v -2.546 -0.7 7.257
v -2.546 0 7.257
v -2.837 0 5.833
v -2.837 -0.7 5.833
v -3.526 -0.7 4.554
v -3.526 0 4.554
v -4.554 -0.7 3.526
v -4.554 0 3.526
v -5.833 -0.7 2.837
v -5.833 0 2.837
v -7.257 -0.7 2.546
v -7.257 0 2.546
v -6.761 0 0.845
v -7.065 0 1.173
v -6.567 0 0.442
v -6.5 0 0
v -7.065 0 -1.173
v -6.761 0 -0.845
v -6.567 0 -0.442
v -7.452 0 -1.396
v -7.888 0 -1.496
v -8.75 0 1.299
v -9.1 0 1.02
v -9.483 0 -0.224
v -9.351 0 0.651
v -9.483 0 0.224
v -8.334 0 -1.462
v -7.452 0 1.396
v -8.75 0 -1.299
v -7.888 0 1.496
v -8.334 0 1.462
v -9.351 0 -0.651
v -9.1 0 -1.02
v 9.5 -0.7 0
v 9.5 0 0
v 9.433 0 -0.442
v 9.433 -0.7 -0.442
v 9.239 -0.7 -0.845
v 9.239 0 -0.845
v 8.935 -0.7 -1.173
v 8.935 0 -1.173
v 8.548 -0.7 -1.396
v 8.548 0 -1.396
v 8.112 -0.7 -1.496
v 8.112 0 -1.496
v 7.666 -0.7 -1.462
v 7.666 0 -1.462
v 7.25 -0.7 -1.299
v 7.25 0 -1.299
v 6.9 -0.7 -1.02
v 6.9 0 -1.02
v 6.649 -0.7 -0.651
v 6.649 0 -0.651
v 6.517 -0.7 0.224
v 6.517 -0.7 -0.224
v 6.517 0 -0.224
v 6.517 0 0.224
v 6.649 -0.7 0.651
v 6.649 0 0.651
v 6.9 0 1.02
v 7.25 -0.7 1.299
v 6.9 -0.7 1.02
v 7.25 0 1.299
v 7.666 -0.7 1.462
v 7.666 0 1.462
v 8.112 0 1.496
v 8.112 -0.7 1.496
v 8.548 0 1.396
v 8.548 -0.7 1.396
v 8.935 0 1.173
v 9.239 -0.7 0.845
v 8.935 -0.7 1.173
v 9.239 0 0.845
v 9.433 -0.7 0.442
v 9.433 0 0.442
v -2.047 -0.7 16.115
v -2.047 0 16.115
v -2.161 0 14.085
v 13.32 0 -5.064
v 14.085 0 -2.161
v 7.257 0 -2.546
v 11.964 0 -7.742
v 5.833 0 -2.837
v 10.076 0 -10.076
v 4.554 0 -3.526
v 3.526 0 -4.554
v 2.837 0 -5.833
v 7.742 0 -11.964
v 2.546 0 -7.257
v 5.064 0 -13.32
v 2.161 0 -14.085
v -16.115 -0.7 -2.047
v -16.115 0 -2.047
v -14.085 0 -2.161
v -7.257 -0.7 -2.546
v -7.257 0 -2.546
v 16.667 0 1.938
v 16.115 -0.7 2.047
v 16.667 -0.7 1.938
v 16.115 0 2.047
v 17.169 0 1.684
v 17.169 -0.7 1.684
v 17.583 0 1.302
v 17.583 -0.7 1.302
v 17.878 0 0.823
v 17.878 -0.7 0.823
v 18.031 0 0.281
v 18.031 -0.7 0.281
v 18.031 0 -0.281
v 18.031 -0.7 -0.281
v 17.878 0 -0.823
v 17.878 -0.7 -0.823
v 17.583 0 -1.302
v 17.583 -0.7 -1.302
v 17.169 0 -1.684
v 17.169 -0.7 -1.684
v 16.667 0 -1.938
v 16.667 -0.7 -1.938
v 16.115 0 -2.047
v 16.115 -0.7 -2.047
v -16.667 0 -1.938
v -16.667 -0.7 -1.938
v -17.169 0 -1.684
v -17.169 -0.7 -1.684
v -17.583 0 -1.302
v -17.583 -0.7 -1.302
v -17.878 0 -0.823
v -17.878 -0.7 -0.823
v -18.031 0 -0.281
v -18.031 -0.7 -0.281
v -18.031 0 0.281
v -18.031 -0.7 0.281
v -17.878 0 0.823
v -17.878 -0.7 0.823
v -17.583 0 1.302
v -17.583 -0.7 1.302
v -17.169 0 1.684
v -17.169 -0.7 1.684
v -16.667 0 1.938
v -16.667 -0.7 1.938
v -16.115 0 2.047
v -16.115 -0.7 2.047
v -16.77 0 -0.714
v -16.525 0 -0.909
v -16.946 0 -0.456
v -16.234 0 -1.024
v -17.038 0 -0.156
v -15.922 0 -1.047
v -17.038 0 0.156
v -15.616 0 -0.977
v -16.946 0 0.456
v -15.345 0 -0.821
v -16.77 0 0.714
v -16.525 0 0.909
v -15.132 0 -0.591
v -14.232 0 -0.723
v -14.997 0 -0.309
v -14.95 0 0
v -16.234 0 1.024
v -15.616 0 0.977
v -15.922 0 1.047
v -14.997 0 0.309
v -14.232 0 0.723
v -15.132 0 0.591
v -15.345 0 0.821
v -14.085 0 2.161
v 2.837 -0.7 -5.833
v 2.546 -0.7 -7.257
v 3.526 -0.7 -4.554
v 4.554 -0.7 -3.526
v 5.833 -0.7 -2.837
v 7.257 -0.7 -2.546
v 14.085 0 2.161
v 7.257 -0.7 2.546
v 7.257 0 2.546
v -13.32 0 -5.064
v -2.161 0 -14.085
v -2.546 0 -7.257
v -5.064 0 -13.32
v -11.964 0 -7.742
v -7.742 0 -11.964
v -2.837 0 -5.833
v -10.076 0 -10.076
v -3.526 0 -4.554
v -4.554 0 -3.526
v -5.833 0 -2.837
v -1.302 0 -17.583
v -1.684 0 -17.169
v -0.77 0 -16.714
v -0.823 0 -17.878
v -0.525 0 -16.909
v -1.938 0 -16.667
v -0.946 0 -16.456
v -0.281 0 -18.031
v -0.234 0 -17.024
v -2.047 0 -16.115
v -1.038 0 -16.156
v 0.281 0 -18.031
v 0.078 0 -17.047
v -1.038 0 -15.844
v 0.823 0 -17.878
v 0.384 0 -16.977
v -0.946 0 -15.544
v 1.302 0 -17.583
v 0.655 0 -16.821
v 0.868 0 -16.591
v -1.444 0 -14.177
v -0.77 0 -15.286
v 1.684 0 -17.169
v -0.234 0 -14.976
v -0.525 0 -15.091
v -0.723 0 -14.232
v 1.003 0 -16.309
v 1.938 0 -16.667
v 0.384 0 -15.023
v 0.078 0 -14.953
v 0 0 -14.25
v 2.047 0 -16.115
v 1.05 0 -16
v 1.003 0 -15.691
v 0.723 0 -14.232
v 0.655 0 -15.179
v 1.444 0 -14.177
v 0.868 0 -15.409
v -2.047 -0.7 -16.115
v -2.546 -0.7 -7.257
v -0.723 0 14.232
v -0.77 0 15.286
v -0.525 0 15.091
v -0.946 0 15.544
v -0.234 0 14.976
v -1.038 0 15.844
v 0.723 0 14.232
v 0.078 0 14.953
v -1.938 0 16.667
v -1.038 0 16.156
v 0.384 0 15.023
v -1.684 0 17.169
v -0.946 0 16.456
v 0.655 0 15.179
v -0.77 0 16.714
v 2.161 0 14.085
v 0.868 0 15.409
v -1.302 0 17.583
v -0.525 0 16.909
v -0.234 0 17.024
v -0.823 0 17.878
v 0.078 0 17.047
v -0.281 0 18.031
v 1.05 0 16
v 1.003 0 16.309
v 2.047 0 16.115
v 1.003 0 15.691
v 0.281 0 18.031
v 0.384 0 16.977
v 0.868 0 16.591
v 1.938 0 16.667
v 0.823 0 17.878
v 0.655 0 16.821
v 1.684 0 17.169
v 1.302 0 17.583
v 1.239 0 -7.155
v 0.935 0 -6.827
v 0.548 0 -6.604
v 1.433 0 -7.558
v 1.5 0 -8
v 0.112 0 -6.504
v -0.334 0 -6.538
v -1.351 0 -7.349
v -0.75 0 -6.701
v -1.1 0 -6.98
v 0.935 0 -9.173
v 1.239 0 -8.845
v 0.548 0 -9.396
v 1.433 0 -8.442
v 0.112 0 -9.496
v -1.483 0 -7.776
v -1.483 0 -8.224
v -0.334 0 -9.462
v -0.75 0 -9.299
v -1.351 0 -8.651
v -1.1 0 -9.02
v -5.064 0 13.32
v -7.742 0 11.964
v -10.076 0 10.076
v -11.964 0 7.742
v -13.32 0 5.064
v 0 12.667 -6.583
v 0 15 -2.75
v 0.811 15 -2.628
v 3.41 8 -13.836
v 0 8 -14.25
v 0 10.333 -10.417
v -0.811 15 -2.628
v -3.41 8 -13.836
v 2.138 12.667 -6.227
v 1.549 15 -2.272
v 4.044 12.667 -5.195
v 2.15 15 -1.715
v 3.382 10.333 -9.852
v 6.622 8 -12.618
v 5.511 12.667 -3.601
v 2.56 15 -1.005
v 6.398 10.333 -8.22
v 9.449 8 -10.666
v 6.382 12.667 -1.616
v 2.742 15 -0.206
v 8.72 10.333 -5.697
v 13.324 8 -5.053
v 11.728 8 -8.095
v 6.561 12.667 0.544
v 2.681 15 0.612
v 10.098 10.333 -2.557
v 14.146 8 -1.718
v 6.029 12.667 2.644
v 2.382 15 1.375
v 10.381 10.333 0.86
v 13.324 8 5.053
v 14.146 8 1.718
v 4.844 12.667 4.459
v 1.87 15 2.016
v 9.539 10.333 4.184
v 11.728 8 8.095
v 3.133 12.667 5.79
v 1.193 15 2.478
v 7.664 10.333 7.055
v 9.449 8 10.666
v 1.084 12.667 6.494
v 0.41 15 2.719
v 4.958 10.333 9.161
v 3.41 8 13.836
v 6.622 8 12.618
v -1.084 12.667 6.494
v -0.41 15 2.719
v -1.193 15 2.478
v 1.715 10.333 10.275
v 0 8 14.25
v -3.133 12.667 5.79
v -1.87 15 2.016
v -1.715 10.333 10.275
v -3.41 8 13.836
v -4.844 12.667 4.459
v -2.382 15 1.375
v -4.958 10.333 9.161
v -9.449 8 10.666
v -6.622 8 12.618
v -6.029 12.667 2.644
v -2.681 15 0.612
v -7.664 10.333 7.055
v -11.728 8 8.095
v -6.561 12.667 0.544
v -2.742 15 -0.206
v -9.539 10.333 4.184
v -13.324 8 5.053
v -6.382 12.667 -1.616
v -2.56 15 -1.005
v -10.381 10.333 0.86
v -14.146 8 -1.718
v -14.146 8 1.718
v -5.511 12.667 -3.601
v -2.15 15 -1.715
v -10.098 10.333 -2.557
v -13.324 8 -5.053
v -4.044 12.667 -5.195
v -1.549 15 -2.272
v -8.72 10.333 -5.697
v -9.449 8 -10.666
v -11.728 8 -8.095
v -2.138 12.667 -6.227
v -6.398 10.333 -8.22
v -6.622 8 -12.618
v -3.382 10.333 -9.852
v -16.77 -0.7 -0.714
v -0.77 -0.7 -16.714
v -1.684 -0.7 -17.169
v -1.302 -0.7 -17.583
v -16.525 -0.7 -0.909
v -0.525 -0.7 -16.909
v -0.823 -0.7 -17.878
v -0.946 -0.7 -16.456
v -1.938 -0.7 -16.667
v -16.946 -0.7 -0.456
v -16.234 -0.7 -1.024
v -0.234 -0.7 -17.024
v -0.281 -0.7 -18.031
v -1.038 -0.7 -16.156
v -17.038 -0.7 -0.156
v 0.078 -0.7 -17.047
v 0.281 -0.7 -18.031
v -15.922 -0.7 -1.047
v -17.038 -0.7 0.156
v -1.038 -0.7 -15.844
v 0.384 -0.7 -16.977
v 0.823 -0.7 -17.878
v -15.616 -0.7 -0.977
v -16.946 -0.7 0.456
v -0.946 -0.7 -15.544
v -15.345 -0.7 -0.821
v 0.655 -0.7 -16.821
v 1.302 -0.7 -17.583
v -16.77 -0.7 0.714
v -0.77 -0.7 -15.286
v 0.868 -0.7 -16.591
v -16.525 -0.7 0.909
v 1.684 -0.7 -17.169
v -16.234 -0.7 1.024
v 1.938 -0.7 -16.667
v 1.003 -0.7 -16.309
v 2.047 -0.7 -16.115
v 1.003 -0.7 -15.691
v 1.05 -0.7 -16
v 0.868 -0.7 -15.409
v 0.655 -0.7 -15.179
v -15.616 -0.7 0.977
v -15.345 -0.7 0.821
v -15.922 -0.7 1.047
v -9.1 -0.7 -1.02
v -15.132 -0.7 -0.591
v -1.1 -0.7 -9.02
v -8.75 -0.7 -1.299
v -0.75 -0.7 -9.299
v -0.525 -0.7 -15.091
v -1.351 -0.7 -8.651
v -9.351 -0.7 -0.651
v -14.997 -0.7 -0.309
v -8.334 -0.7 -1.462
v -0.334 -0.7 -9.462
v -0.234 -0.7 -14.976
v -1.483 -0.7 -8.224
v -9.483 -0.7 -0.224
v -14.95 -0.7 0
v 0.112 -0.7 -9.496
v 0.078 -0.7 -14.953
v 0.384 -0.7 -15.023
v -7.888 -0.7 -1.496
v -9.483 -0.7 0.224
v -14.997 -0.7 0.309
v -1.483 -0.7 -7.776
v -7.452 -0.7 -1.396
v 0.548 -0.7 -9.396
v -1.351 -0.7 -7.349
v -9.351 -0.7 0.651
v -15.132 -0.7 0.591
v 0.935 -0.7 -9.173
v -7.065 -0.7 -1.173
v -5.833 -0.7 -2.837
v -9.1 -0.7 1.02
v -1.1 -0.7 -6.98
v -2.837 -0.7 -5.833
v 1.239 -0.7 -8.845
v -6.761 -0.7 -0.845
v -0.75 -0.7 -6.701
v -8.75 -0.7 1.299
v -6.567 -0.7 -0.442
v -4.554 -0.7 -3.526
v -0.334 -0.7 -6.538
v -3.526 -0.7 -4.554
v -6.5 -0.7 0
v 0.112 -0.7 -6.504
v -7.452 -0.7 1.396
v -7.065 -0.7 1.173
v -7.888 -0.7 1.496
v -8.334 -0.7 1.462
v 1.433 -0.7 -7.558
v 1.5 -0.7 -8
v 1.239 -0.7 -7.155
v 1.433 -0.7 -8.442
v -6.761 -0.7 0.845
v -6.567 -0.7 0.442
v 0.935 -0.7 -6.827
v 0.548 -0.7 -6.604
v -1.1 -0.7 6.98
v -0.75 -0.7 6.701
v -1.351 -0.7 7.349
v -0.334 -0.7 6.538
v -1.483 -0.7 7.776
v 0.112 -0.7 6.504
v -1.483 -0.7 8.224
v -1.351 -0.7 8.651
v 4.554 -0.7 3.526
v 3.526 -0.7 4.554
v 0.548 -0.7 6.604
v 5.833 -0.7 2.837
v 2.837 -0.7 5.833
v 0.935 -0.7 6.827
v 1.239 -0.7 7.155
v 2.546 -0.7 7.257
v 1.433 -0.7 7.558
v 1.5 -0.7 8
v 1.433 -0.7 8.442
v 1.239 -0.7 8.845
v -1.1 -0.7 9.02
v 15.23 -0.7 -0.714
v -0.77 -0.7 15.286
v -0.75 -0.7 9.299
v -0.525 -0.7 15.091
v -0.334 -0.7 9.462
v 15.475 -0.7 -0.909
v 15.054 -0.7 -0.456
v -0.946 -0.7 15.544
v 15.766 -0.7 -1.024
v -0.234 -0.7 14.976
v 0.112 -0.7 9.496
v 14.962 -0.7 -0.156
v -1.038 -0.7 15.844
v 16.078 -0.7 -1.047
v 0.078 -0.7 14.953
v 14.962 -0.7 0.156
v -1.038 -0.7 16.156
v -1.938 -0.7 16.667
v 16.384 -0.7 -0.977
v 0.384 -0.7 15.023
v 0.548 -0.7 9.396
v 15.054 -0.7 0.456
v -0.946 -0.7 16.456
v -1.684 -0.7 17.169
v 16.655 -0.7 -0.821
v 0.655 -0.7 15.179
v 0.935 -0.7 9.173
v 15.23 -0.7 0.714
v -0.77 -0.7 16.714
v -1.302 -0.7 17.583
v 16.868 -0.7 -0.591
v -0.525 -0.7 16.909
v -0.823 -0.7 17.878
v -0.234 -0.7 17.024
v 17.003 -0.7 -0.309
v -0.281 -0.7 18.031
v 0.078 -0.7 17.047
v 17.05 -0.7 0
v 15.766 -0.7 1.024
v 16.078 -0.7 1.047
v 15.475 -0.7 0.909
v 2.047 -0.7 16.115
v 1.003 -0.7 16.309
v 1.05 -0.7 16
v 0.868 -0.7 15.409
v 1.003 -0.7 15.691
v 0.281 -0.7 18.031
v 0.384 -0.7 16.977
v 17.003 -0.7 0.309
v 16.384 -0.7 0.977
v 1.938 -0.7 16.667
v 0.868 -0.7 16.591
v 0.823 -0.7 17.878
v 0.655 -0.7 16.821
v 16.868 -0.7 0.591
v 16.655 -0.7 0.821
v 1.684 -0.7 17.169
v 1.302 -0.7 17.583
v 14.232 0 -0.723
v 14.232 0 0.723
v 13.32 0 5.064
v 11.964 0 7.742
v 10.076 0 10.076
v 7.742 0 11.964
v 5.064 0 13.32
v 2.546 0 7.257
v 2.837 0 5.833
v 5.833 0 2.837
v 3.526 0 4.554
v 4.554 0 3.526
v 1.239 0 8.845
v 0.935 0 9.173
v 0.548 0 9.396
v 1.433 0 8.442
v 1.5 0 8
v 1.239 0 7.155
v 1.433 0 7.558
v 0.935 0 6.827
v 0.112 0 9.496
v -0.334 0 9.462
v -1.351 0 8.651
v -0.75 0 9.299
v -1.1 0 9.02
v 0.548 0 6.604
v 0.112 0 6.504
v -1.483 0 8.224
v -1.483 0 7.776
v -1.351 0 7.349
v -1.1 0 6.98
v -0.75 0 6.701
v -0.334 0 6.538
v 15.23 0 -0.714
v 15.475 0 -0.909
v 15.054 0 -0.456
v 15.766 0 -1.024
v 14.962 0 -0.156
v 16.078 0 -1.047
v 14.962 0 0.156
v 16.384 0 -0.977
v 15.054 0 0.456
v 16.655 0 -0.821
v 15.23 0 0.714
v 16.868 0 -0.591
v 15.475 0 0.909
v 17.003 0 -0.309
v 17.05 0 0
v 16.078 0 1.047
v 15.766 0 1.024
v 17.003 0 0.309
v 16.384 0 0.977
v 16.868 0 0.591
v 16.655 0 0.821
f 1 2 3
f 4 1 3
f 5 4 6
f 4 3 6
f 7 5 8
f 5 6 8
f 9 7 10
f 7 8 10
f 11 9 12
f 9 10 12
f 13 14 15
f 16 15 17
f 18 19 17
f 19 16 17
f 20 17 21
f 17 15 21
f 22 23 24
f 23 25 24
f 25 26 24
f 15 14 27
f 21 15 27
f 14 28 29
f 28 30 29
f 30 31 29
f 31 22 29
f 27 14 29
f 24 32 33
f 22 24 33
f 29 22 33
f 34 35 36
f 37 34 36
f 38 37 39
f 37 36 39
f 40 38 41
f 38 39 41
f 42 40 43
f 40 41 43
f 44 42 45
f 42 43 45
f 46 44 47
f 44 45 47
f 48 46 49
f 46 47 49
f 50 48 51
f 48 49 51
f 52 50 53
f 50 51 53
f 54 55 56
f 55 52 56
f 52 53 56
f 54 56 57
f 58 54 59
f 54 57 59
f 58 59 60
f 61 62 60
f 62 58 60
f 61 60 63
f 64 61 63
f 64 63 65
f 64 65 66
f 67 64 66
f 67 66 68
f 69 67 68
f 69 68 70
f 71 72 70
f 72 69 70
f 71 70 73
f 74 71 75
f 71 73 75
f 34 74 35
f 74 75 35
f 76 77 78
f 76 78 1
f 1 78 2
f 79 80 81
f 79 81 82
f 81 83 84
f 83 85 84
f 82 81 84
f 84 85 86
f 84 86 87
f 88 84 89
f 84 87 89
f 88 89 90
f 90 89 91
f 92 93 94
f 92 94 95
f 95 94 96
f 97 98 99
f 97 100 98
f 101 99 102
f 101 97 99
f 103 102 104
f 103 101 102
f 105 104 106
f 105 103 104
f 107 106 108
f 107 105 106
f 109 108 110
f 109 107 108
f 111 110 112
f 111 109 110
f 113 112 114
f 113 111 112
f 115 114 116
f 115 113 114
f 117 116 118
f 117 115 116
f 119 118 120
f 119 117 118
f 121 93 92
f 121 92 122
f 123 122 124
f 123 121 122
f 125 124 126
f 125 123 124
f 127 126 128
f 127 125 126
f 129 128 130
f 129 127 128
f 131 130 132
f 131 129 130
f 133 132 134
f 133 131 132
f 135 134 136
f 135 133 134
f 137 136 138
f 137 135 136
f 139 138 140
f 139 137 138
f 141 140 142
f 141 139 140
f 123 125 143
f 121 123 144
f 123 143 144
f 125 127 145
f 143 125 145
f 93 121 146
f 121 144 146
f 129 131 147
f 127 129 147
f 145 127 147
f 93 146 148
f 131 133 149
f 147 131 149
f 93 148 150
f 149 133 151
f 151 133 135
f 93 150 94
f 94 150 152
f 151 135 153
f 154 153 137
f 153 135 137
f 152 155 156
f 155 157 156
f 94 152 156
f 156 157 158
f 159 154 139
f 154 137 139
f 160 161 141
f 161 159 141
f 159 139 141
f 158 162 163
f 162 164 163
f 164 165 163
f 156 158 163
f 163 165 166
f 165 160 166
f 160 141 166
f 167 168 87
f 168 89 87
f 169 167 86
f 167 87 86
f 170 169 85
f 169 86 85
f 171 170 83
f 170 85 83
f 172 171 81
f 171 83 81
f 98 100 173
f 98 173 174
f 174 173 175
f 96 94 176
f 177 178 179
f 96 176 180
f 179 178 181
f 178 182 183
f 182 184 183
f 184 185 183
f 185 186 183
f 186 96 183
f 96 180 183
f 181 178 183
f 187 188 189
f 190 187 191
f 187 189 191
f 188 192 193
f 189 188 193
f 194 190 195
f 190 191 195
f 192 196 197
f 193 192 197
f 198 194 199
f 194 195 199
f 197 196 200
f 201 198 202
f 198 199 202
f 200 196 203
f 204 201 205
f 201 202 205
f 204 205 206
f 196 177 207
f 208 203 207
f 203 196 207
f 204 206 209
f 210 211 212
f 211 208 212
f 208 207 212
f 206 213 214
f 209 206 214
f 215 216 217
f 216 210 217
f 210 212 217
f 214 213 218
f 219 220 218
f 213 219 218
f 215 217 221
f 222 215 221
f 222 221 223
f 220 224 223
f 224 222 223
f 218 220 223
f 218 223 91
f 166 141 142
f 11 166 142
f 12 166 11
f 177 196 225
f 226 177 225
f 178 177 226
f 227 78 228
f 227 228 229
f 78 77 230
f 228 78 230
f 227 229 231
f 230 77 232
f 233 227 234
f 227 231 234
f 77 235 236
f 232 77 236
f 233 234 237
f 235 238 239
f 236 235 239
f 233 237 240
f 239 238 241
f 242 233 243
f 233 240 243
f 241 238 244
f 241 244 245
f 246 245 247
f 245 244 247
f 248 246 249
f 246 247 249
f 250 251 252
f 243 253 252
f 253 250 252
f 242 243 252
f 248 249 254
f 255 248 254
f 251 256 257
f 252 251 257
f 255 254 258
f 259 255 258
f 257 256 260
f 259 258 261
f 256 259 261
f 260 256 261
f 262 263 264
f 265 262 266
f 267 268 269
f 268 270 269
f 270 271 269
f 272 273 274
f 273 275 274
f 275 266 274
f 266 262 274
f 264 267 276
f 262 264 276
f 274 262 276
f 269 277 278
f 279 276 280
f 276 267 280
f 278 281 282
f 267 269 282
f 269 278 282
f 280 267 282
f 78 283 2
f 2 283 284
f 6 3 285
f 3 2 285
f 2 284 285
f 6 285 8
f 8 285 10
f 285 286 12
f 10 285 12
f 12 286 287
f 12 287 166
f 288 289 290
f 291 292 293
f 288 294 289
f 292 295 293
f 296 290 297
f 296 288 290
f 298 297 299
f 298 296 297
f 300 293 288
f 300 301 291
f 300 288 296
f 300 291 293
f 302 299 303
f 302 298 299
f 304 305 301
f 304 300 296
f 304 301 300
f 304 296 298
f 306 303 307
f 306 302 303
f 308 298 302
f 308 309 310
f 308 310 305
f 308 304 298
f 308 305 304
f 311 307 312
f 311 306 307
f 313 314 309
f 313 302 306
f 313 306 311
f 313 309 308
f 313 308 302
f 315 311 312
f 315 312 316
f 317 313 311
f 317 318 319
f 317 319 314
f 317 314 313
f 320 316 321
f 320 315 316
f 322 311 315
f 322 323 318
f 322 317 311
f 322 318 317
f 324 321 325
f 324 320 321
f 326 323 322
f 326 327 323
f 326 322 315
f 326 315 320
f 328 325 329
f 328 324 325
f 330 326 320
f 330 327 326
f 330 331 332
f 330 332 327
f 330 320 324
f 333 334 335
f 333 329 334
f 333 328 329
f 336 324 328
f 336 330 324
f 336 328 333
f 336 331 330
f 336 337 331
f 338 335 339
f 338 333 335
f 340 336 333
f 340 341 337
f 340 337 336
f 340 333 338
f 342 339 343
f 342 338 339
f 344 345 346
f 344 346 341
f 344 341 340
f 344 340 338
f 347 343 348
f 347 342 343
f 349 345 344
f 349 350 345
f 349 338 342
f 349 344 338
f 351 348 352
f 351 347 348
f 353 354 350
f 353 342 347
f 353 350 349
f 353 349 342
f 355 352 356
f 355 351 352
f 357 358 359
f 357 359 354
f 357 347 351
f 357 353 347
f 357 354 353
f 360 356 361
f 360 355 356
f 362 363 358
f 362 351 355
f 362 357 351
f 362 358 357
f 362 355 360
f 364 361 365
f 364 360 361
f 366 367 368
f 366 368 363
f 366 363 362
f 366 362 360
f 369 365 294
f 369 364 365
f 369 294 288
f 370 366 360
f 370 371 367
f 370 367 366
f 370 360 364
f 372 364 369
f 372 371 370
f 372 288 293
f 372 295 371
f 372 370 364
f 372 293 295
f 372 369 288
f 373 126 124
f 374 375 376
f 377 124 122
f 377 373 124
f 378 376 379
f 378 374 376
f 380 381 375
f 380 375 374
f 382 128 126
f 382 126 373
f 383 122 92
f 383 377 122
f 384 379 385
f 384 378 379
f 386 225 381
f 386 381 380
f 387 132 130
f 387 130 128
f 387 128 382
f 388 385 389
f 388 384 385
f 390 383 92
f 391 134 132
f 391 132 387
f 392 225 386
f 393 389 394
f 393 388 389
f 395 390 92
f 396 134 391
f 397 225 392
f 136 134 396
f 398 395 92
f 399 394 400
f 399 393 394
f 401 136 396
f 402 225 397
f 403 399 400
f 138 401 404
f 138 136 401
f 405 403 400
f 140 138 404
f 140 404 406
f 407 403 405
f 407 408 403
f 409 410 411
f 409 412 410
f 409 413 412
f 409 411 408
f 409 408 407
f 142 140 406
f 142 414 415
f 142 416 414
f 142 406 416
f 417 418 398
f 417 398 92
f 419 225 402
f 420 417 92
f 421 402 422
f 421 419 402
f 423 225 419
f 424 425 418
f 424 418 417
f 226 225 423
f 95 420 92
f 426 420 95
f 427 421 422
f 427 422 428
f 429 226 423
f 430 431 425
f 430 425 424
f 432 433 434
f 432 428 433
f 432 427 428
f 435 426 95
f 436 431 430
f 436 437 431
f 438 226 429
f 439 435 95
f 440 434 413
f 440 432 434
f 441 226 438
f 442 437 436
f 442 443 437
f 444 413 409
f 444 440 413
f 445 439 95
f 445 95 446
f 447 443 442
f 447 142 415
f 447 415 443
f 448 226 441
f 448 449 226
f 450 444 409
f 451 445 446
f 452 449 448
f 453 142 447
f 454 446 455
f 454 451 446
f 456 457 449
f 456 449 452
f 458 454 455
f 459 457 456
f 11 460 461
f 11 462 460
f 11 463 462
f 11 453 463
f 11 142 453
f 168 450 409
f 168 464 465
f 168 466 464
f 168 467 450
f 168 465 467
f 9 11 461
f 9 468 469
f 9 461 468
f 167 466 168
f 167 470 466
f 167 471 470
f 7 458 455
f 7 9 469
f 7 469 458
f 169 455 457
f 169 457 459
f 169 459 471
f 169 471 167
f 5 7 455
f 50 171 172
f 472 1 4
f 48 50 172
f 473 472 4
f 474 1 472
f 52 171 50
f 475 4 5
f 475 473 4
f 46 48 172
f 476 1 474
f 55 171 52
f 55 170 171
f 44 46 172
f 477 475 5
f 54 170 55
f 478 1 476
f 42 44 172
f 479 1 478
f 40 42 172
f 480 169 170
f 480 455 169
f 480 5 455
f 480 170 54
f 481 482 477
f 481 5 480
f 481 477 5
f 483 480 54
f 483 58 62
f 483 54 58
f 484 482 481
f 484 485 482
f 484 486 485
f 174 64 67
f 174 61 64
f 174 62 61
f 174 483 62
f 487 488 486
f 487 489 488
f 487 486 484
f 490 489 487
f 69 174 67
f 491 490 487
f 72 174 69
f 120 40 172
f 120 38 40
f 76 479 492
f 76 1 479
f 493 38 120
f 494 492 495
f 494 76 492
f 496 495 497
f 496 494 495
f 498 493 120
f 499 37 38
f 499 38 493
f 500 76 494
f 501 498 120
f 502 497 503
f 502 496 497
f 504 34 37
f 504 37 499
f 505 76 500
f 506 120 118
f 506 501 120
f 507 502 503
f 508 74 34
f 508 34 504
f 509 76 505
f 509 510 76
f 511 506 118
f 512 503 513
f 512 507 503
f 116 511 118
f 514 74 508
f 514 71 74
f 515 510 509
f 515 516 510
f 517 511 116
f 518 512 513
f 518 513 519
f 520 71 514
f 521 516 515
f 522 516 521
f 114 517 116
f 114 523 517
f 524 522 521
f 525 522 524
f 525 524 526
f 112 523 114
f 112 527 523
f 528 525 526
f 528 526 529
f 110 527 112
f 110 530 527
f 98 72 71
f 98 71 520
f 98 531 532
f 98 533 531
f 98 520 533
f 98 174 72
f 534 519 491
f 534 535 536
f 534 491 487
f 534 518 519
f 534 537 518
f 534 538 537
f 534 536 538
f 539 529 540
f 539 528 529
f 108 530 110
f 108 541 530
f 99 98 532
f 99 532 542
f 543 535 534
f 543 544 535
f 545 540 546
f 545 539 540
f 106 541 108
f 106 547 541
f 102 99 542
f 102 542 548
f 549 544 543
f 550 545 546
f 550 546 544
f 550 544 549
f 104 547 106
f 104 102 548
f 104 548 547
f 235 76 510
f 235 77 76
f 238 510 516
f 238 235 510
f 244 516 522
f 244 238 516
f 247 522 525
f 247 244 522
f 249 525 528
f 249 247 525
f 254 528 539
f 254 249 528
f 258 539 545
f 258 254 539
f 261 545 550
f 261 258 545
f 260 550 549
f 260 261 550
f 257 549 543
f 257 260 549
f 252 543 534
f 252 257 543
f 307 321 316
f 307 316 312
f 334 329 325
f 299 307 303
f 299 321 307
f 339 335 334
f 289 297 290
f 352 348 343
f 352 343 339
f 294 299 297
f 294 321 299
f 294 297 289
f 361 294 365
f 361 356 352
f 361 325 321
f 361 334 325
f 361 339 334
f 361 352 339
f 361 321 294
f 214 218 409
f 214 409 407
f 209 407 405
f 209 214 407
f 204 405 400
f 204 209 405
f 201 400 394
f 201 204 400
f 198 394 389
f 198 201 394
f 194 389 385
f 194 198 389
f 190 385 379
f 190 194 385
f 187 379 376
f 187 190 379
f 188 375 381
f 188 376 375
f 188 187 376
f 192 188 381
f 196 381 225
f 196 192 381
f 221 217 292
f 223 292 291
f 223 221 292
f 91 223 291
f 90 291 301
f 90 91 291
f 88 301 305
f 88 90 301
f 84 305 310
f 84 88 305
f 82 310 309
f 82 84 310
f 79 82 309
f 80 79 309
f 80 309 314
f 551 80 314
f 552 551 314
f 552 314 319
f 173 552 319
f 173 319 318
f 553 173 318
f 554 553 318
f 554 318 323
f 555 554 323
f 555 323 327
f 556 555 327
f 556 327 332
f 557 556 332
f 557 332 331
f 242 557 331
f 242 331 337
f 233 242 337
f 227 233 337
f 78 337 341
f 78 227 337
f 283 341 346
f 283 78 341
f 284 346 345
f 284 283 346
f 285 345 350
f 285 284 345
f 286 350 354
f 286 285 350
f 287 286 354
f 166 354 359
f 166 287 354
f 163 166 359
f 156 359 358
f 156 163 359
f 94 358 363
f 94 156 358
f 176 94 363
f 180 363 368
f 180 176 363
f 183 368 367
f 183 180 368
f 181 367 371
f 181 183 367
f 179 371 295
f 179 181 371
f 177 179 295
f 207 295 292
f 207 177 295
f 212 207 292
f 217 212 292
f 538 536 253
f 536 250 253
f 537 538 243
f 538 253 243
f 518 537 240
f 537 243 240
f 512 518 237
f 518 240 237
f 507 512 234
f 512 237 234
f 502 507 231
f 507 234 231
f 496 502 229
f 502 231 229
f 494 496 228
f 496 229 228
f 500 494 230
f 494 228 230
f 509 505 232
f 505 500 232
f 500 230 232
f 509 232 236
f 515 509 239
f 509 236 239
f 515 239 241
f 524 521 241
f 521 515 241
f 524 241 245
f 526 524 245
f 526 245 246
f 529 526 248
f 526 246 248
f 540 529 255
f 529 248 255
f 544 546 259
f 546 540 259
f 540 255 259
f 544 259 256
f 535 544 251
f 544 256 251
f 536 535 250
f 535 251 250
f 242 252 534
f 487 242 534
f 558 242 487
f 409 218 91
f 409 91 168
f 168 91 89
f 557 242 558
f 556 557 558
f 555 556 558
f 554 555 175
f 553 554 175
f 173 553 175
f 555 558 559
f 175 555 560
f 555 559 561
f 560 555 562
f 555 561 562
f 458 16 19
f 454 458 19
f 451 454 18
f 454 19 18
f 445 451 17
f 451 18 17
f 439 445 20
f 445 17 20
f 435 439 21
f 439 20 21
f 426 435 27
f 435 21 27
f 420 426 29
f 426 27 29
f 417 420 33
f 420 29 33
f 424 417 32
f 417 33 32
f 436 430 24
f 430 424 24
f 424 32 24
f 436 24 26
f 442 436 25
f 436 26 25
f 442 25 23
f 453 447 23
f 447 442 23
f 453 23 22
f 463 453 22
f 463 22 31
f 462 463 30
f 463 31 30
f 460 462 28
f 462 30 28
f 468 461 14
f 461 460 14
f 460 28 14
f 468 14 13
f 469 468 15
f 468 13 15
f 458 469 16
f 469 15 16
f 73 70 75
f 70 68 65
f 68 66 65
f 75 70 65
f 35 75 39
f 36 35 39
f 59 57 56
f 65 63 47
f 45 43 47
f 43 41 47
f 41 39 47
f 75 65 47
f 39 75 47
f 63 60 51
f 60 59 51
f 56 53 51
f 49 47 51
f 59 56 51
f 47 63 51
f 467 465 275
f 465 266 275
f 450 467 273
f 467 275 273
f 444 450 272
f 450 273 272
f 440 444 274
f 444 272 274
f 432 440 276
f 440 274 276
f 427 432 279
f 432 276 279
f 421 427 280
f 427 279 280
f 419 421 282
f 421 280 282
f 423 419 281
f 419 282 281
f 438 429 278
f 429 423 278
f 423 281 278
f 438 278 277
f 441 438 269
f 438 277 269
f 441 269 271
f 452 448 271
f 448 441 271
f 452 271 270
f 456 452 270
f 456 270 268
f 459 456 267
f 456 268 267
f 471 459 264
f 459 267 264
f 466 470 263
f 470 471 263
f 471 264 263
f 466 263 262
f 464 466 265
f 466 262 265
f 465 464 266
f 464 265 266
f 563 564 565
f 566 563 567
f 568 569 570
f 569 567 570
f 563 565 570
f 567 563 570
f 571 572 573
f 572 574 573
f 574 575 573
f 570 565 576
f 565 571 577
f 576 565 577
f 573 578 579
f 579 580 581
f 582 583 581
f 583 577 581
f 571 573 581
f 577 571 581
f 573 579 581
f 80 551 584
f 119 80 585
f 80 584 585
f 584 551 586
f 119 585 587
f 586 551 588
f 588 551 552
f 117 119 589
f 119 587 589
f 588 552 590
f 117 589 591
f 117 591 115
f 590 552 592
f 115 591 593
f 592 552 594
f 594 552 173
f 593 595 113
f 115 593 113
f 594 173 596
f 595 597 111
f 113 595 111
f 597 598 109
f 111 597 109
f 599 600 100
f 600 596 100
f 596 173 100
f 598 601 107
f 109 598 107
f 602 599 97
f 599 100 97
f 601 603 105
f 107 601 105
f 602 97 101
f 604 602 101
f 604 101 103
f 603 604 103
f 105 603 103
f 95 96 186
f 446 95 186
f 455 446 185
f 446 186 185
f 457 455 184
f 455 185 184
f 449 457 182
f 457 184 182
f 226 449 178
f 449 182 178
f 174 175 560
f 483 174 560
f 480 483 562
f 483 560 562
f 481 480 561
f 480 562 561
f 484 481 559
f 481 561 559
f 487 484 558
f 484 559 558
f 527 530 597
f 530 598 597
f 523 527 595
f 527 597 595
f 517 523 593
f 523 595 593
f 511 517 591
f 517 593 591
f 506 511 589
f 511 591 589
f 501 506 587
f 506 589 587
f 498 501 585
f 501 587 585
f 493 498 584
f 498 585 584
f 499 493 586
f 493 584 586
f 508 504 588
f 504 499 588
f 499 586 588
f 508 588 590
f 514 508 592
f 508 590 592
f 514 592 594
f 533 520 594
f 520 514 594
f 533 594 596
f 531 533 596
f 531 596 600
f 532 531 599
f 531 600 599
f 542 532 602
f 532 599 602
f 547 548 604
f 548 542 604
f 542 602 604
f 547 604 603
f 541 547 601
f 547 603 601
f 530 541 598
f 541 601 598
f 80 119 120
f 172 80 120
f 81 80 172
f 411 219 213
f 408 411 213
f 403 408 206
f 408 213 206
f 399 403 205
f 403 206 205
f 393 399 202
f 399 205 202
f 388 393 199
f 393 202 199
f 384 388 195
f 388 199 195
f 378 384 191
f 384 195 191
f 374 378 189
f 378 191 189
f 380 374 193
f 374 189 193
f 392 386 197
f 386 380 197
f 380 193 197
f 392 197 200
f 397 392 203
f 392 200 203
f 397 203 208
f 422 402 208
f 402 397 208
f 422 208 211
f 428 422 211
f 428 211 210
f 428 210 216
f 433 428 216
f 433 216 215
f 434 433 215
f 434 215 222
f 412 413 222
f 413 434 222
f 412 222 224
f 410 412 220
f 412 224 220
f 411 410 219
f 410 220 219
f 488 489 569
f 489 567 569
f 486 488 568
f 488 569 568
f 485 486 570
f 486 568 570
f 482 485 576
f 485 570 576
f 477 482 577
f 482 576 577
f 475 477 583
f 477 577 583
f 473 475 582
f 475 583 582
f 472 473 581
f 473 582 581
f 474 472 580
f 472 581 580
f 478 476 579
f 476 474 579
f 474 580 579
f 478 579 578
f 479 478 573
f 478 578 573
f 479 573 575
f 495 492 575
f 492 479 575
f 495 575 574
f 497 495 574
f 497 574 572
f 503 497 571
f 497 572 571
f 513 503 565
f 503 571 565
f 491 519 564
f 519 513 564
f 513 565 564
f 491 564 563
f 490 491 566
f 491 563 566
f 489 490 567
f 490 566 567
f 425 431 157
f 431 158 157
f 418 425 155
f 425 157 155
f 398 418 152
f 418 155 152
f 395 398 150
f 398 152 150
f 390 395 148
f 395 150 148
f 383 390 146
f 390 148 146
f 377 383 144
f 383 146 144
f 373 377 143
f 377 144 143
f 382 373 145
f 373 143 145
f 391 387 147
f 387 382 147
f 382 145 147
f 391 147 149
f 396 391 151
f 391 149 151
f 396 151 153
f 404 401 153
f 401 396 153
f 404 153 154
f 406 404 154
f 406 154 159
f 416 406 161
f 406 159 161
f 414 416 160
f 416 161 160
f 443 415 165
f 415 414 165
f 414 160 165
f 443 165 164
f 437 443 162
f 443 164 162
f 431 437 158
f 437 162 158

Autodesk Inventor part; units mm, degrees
ref_plane "YZ Plane" through (0, 0, 0) normal (1, 0, 0) x (0, 1, 0)
ref_plane "XZ Plane" through (0, 0, 0) normal (0, 1, 0) x (-1, 0, 0)
ref_plane "XY Plane" through (0, 0, 0) normal (0, 0, 1) x (1, 0, 0)
sketch "スケッチ1" plane through (0, 0, 0) normal (1, 0, 0) x (0, 1, 0)
  line L0 (0, 0) -> (15, 0)
  line L1 (15, 0) -> (15, -2.75)
  line L2 (15, -2.75) -> (8, -14.25)
  line L3 (8, -14.25) -> (0, -14.25)
  line L4 (0, -14.25) -> (0, 0)
  dimension "d0" = 14.25
  dimension "d1" = 15
  dimension "d2" = 2.75
  dimension "d3" = 8
revolve "回転1" add sketch "スケッチ1" angle 360 about axis through (0, 0, 0) along (0, 1, 0)
sketch "スケッチ2" plane through (0, 0, 0) normal (0, -1, 0) x (1, 0, 0)
  circle A0 centre (0, 16) radius 1.05
  circle A1 centre (0, 8) radius 1.5
  arc A2 (2.0468, 16.1153) -> (-2.0468, 16.1153) centre (0, 16) ccw
  line L0 (2.0468, 16.1153) -> (2.5458, 7.2567)
  line L1 (-2.0468, 16.1153) -> (-2.5458, 7.2567)
  circle A3 centre (0, 0) radius 14.25 construction
  circle A4 centre (0, 8) radius 2.5 construction
  arc A5 (2.5458, 7.2567) -> (7.2567, 2.5458) centre (7.5379, 7.5379) ccw
  circle A6 centre (-16, 0) radius 1.05
  circle A7 centre (-8, 0) radius 1.5
  arc A8 (-16.1153, 2.0468) -> (-16.1153, -2.0468) centre (-16, 0) ccw
  line L2 (-16.1153, 2.0468) -> (-7.2567, 2.5458)
  line L3 (-16.1153, -2.0468) -> (-7.2567, -2.5458)
  circle A9 centre (-8, 0) radius 2.5 construction
  arc A10 (-7.2567, 2.5458) -> (-2.5458, 7.2567) centre (-7.5379, 7.5379) ccw
  circle A11 centre (0, -16) radius 1.05
  circle A12 centre (0, -8) radius 1.5
  arc A13 (-2.0468, -16.1153) -> (2.0468, -16.1153) centre (0, -16) ccw
  line L4 (-2.0468, -16.1153) -> (-2.5458, -7.2567)
  line L5 (2.0468, -16.1153) -> (2.5458, -7.2567)
  circle A14 centre (0, -8) radius 2.5 construction
  arc A15 (-2.5458, -7.2567) -> (-7.2567, -2.5458) centre (-7.5379, -7.5379) ccw
  circle A16 centre (16, 0) radius 1.05
  circle A17 centre (8, 0) radius 1.5
  arc A18 (16.1153, -2.0468) -> (16.1153, 2.0468) centre (16, 0) ccw
  line L6 (16.1153, -2.0468) -> (7.2567, -2.5458)
  line L7 (16.1153, 2.0468) -> (7.2567, 2.5458)
  circle A19 centre (8, 0) radius 2.5 construction
  arc A20 (7.2567, -2.5458) -> (2.5458, -7.2567) centre (7.5379, -7.5379) ccw
  point P0 (7.2567, 2.5458)
  dimension "d5" = 2.1
  dimension "d6" = 3
  dimension "d7" = 16
  dimension "d8" = 1
  dimension "d9" = 1
  dimension "d10" = 5
  dimension "d13" = 360
  dimension "d15" = 8
extrude "押し出し1" add sketch "スケッチ2" along normal blind 0.7
properties part number "MainMotor._Newipt"
